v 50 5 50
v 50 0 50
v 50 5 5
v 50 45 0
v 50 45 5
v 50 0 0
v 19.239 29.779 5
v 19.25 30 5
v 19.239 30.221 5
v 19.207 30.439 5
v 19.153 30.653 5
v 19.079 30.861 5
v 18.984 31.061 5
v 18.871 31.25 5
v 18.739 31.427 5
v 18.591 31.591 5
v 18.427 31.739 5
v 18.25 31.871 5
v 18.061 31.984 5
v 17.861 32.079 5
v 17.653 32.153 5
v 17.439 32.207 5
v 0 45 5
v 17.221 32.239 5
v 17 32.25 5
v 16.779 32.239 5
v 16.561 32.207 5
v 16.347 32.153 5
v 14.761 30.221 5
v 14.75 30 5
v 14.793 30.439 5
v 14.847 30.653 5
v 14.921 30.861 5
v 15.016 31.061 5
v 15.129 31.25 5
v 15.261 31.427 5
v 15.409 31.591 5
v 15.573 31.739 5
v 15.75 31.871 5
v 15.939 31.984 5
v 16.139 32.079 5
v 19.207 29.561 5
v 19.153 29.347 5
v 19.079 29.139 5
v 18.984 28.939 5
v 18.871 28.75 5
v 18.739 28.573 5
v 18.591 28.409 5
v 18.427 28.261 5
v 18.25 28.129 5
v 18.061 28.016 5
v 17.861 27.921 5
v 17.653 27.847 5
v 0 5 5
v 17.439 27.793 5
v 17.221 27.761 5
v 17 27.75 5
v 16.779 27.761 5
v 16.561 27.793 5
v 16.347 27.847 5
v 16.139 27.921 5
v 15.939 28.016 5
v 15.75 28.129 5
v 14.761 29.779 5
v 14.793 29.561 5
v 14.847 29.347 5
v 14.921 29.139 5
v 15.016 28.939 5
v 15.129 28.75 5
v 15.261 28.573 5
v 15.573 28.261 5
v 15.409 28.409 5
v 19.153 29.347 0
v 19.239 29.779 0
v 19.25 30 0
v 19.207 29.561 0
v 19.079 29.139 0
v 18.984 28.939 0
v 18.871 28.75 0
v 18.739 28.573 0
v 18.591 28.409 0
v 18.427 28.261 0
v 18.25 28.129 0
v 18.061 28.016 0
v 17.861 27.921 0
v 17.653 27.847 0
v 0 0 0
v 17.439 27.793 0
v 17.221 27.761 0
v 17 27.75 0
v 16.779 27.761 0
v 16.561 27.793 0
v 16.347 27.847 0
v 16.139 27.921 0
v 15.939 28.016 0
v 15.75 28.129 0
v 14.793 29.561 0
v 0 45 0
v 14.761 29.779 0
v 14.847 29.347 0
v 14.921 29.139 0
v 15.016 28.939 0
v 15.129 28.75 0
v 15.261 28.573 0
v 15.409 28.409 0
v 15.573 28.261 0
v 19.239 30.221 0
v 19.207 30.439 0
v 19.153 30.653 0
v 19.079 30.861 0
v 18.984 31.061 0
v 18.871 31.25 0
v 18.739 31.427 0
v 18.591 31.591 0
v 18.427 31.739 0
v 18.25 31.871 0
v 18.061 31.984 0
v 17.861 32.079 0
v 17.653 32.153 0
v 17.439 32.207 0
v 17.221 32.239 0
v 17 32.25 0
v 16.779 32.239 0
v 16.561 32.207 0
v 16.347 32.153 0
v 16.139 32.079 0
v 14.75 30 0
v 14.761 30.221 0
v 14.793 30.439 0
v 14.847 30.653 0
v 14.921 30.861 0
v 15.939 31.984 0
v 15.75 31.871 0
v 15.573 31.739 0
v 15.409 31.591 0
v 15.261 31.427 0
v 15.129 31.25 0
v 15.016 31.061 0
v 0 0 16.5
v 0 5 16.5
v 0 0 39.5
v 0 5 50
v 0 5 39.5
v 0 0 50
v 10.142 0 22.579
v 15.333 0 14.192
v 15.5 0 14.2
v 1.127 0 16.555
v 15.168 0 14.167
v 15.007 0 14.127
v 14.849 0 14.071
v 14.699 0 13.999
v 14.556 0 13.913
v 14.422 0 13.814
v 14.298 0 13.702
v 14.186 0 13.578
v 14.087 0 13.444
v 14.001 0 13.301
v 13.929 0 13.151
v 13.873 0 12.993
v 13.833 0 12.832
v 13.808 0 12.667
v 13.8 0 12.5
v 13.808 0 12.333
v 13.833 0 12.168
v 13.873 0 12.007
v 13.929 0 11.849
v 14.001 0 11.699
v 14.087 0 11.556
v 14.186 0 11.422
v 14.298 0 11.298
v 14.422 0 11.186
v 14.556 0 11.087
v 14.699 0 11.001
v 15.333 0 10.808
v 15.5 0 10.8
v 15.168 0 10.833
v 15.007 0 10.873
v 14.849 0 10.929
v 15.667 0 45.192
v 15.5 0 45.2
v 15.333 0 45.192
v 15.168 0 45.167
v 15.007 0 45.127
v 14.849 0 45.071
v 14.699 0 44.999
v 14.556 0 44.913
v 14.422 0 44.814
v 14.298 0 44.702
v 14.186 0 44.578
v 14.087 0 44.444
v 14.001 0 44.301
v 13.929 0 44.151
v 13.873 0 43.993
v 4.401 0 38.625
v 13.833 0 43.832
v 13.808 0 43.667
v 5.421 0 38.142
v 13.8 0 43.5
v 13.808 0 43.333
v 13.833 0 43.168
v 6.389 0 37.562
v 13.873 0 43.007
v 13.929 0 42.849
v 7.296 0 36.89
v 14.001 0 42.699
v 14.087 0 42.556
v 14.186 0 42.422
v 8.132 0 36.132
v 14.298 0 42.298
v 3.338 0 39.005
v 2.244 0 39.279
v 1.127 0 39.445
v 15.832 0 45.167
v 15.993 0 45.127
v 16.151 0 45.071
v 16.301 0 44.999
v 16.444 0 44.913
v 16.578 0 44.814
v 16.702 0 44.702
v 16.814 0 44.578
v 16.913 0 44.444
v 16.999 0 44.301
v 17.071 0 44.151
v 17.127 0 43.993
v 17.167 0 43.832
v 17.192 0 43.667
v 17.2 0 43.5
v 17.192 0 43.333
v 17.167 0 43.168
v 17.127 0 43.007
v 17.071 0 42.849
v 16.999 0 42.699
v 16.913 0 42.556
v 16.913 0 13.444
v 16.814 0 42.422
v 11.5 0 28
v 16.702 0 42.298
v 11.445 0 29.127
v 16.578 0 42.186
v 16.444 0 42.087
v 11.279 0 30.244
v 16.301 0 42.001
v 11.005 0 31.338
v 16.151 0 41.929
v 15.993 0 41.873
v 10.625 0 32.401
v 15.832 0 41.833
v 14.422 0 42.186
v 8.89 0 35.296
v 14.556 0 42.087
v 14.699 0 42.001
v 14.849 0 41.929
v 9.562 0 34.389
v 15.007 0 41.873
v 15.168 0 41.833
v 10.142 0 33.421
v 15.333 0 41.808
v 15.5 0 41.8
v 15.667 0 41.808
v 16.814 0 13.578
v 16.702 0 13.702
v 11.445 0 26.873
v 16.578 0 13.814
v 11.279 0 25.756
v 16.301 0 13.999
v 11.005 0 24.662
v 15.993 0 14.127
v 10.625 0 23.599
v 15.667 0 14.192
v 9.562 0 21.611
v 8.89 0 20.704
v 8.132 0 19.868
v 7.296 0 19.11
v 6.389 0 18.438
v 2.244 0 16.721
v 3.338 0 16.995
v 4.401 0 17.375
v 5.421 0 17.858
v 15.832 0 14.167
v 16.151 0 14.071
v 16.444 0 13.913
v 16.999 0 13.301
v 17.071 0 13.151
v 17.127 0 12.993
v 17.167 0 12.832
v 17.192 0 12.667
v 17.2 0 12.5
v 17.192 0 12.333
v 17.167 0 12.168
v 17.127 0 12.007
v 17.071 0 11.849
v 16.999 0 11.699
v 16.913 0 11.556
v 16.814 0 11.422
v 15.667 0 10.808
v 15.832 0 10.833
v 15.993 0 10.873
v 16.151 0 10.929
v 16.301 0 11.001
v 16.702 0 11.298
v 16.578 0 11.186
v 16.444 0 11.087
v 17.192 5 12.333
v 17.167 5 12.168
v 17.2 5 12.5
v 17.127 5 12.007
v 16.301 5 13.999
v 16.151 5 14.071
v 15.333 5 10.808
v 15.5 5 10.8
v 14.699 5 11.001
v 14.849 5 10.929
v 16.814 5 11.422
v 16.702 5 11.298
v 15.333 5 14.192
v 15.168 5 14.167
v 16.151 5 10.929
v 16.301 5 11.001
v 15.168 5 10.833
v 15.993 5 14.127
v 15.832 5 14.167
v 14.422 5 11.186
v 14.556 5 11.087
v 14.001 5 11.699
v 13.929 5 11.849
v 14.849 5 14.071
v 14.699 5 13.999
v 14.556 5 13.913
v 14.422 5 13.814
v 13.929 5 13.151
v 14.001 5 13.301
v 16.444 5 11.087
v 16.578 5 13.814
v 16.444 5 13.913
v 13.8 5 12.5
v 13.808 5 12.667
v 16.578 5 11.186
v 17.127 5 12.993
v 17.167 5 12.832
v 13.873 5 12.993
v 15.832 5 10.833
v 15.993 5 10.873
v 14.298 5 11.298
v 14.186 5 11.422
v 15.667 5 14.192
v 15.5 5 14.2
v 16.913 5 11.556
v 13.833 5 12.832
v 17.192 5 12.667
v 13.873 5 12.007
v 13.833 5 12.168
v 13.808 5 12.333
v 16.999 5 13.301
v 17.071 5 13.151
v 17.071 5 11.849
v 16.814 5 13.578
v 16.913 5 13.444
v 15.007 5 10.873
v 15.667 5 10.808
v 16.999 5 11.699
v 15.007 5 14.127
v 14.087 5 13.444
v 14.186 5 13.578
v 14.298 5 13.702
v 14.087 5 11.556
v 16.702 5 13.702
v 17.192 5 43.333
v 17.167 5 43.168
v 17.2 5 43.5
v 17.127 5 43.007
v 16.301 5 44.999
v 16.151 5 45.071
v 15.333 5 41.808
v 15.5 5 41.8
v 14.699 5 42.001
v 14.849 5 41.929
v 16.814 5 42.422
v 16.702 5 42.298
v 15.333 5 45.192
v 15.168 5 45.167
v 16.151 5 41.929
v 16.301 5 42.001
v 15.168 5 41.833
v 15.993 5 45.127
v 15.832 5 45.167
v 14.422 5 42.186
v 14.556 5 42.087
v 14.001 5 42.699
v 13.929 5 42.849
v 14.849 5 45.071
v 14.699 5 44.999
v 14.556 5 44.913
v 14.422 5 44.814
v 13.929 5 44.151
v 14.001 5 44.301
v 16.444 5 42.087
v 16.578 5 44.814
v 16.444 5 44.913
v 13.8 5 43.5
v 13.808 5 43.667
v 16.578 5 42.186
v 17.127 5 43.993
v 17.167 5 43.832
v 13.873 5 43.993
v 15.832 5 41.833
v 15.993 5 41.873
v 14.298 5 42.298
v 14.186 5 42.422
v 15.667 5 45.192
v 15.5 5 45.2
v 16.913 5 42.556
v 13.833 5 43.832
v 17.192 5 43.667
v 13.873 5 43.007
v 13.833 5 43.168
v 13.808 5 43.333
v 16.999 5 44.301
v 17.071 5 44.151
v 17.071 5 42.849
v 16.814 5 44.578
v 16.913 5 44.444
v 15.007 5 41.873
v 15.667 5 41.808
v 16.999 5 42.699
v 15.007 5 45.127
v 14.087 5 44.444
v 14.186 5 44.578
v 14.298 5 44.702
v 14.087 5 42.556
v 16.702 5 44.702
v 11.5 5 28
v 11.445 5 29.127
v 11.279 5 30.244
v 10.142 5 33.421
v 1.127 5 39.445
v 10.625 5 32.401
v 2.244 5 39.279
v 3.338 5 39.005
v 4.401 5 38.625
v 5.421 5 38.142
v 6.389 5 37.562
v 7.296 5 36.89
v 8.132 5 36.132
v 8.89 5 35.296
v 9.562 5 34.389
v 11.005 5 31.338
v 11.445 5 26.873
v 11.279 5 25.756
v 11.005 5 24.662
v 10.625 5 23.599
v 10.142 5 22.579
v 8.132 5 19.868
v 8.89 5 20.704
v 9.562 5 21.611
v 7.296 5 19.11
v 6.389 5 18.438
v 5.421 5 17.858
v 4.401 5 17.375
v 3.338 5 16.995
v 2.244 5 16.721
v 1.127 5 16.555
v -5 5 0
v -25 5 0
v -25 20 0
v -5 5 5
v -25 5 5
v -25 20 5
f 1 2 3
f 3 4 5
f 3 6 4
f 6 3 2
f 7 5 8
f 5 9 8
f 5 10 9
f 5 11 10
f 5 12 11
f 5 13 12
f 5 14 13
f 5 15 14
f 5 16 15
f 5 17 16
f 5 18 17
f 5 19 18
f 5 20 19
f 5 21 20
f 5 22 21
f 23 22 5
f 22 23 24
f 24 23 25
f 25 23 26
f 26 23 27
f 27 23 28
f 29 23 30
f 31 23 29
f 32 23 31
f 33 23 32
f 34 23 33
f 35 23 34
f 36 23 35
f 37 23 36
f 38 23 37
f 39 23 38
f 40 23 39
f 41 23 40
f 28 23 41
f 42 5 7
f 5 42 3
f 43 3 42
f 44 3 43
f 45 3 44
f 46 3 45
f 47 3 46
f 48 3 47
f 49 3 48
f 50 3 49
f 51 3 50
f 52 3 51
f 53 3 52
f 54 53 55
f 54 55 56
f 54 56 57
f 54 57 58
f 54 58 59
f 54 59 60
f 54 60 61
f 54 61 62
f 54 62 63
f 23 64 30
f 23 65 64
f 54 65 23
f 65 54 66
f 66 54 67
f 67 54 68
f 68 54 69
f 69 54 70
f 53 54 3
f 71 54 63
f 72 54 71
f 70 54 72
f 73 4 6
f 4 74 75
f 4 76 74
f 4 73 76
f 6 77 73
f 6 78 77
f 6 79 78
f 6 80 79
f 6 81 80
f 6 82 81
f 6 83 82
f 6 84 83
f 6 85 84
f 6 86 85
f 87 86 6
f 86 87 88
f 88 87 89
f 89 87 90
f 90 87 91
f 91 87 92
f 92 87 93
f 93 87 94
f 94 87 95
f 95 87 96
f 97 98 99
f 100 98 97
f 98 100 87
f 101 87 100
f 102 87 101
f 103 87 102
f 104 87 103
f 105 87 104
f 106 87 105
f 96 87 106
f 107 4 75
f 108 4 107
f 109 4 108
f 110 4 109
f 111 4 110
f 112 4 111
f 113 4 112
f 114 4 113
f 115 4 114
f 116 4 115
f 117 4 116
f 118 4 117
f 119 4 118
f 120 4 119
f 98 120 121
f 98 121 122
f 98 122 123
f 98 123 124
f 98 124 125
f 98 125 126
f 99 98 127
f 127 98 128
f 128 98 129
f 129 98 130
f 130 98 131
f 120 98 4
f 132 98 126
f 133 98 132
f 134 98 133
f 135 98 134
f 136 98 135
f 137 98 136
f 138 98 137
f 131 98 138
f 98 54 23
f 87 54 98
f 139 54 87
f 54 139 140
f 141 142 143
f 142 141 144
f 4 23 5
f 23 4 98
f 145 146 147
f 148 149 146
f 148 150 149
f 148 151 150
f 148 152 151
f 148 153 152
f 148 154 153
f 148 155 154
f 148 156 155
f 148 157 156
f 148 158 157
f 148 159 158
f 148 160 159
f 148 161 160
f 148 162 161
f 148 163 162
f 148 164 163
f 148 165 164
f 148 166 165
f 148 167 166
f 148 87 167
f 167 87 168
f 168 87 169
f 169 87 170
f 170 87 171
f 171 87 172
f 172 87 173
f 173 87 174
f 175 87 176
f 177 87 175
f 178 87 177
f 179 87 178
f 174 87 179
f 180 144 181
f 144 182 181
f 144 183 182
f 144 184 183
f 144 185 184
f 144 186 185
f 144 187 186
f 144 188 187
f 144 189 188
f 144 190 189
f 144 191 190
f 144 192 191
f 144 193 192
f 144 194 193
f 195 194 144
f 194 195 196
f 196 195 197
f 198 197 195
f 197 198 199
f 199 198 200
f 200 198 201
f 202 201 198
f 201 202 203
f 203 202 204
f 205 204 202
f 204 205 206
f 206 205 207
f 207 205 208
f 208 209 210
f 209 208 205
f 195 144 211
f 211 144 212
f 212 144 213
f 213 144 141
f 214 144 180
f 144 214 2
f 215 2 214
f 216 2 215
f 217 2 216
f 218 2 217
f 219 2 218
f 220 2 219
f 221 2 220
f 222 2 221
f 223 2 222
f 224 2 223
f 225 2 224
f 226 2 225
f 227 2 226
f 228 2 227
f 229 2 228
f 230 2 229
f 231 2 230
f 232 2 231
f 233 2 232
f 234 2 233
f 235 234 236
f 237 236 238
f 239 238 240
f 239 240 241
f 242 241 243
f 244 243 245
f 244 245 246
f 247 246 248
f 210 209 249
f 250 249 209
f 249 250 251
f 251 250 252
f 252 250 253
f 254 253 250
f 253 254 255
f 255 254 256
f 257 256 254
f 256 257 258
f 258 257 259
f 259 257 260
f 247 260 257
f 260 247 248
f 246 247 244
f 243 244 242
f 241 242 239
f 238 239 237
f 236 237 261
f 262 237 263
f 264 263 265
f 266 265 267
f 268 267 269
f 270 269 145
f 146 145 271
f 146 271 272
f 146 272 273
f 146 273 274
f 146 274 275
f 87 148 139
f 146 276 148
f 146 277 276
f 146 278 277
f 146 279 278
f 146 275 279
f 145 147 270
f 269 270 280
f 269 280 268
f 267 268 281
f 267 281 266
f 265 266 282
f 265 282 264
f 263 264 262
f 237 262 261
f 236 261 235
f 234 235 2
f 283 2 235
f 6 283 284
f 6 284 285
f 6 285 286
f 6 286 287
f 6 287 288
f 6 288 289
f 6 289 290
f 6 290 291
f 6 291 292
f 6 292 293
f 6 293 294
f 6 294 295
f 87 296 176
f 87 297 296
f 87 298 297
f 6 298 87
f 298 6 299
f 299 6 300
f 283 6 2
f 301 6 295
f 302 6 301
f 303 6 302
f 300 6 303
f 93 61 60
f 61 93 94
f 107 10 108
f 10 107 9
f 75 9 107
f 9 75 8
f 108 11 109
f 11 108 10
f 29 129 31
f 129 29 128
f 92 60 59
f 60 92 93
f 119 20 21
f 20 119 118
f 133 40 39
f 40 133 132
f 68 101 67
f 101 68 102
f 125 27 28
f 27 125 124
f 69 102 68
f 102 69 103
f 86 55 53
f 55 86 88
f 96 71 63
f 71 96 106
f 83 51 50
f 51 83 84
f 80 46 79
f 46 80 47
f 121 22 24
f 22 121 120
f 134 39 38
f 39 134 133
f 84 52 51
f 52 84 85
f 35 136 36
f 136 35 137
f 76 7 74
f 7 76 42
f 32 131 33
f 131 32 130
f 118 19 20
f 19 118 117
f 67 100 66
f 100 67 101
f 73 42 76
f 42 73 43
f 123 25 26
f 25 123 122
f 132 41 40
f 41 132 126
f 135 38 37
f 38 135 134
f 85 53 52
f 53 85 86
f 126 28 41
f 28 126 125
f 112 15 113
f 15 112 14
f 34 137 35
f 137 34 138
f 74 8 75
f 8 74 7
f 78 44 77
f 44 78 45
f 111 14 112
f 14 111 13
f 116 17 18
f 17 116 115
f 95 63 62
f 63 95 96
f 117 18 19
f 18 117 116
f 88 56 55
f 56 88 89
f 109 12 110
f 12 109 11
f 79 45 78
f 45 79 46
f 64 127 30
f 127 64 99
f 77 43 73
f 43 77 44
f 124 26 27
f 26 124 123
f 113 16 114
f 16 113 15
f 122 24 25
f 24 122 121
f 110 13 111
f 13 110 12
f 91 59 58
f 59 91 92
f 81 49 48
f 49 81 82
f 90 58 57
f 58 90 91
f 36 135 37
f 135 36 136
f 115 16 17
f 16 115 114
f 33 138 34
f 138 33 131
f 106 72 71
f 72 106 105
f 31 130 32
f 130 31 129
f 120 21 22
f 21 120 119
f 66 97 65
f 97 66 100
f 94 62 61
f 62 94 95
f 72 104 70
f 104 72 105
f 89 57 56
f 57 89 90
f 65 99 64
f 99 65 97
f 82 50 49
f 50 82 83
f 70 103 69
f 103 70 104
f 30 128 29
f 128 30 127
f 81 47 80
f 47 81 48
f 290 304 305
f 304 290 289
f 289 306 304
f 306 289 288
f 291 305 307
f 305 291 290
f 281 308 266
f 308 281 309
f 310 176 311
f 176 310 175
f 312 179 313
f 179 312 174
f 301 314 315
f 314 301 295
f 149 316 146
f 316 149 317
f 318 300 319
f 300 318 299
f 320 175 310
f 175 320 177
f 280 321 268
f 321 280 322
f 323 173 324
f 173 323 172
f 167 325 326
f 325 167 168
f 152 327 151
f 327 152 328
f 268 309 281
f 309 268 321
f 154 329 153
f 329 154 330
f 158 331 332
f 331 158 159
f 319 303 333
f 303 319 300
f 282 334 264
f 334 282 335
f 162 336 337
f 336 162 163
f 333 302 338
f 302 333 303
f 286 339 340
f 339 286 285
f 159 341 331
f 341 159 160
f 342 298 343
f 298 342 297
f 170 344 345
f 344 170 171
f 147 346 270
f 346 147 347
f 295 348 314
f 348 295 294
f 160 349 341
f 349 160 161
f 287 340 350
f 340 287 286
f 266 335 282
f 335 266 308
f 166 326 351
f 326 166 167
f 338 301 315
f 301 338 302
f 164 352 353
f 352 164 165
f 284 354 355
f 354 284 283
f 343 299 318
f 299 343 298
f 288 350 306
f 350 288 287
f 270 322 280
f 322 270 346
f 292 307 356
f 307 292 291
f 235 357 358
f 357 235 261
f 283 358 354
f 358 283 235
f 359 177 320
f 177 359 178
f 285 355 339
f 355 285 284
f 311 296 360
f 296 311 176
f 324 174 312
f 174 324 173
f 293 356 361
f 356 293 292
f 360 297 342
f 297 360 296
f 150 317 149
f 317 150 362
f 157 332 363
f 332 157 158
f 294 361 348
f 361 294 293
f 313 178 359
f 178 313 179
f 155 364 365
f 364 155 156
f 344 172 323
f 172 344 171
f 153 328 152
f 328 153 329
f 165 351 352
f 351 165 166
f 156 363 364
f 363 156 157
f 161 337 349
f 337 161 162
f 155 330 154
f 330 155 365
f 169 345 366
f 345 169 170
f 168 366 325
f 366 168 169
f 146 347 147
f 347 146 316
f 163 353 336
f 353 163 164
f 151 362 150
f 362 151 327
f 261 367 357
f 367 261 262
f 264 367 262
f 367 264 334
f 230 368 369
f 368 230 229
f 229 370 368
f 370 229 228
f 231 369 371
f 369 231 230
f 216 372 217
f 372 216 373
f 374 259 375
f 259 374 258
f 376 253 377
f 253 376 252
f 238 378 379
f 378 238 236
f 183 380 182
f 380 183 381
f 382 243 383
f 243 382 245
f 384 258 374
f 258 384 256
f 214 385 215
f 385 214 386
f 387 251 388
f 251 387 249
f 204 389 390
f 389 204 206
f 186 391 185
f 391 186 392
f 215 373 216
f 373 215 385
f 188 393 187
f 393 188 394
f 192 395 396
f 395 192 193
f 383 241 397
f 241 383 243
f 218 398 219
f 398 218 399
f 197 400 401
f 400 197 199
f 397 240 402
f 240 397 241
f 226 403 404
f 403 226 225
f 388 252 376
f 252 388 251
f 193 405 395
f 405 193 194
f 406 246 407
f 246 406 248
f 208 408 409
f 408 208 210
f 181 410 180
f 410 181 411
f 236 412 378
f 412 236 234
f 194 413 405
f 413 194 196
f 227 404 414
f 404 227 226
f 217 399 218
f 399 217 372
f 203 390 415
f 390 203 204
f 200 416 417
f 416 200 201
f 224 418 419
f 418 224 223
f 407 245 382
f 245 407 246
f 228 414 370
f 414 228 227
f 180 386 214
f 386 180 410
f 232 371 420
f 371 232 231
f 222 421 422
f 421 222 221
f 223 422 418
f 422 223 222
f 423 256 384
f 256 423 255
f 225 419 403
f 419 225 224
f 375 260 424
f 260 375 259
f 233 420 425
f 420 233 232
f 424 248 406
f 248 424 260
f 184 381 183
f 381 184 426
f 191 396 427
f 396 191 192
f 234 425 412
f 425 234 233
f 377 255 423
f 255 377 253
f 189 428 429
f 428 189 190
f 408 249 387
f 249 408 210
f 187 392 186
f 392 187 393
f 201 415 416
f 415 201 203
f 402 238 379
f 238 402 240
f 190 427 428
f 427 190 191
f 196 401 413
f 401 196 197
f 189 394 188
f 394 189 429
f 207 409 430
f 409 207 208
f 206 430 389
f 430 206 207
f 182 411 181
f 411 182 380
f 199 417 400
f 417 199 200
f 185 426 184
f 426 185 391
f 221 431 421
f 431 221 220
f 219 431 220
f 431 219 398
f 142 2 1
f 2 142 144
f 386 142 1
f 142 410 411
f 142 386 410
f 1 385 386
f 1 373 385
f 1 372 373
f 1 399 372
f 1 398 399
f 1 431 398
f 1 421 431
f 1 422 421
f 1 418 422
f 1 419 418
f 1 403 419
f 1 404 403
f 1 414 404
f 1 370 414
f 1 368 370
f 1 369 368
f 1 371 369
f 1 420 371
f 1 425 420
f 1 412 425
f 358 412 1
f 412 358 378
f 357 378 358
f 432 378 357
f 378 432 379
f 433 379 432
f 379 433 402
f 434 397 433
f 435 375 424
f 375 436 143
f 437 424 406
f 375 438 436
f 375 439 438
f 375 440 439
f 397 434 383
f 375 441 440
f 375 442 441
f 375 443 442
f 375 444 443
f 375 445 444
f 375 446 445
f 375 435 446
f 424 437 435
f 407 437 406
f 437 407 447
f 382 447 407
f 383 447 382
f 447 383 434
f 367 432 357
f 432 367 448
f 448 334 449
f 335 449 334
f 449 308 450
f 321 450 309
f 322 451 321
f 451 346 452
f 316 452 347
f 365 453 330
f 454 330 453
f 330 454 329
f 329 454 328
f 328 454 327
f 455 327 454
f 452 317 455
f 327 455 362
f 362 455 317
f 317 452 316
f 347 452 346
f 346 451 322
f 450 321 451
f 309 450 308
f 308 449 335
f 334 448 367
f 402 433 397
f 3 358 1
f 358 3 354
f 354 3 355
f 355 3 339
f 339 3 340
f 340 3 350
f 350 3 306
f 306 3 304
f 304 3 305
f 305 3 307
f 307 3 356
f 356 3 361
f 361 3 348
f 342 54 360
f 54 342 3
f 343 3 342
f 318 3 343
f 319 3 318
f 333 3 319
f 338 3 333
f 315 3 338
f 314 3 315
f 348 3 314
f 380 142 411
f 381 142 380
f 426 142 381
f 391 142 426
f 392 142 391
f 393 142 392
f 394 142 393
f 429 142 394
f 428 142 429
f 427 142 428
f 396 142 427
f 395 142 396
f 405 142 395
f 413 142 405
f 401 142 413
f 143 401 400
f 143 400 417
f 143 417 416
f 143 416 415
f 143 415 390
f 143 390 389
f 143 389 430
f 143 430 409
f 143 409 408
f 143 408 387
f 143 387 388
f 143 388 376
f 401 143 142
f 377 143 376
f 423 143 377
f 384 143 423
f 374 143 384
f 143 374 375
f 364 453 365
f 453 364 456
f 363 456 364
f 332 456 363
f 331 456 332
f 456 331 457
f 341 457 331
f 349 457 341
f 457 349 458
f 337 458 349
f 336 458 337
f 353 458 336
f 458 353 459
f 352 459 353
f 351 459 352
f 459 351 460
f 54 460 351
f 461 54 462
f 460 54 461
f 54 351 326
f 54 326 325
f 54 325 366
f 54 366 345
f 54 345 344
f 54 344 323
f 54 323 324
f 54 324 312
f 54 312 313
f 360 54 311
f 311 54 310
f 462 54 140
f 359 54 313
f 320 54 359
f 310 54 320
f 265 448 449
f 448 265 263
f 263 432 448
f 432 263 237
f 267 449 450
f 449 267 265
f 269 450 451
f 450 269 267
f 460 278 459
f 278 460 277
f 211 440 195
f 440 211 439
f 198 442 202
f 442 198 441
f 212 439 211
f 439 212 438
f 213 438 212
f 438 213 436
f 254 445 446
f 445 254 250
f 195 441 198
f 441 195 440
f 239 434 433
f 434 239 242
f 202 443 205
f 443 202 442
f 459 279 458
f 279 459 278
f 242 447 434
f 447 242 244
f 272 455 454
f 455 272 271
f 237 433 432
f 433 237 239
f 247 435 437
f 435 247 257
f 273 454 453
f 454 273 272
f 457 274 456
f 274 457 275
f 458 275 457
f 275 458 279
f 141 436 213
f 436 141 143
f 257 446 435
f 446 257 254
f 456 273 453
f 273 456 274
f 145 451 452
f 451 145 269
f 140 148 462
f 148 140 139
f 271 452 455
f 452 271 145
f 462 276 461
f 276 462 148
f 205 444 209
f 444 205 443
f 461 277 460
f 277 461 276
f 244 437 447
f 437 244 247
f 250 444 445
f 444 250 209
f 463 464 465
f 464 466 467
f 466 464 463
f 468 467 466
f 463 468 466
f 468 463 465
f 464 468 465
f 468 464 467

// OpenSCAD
// NEMA 17 Stepper Motor L-Bracket for Syringe Pump
// Final Corrected Version

// --- Dimensions ---
// Base Plate
base_x_min = -25;
base_x_max = 25;
base_y_min = 0;
base_y_max = 45;
base_z_height = 5;

// Base Plate Holes (M4)
m4_hole_dia = 4.5;
m4_hole_x1 = -17;
m4_hole_y1 = 30;
m4_hole_x2 = 17;
m4_hole_y2 = 30;

// Vertical Motor Plate
motor_plate_x_min = -25;
motor_plate_x_max = 25;
motor_plate_y_min = 0;
motor_plate_y_max = 5;
motor_plate_z_height = 50;

// Motor Boss Hole (Centering)
boss_hole_dia = 23;
boss_hole_x = 0;
boss_hole_z = 28;

// Motor Screw Holes (M3)
m3_hole_dia = 3.4;
m3_pattern_size = 31;

// Gussets
gusset_thickness = 5;
gusset_leg_y = 20;
gusset_leg_z = 20;
gusset_x_left_min = -25;
gusset_x_left_max = -20;
gusset_x_right_min = 20;
gusset_x_right_max = 25;

// Resolution
$fn = 64;

// --- Modeling ---

module gusset_shape() {
    // A right triangle in YZ plane
    // Corner at y=5, z=5. Legs are 20mm.
    // Vertices in YZ: (5,5), (25,5), (5,25)
    polygon(points = [
        [0, 5], 
        [gusset_leg_y, 5], 
        [0, gusset_leg_z]
    ]);
}

// We use a union of all parts to ensure it is a single solid body
union() {
    // 1. Main Base Plate
    // Centered on X: width is 50, so X goes from -25 to 25.
    // Y goes from 0 to 45.
    difference() {
        cube([base_x_max - base_x_min, base_y_max - base_y_min, base_z_height]);
        
        // M4 Holes (Vertical through holes)
        // Holes are at (x=-17, y=30) and (x=17, y=30)
        translate([m4_hole_x1, m4_hole_y1, -1])
            cylinder(d = m4_hole_dia, h = base_z_height + 2);
        translate([m4_hole_x2, m4_hole_y2, -1])
            cylinder(d = m4_hole_dia, h = base_z_height + 2);
    }

    // 2. Vertical Motor Plate
    // Standing on the back edge of the base (y=0 to y=5).
    // X from -25 to 25. Z from 0 to 50.
    difference() {
        cube([base_x_max - base_x_min, motor_plate_y_max - motor_plate_y_min, motor_plate_z_height]);
        
        // Motor Centering Boss Hole (Cut along Y axis)
        // Center is x=0, z=28.
        translate([boss_hole_x, -1, boss_hole_z])
            rotate([-90, 0, 0])
                cylinder(d = boss_hole_dia, h = motor_plate_y_max + 2);
        
        // M3 Screw Holes (4 holes on 31mm square pattern)
        // Pattern is centered on the boss hole (0, 28)
        for (px = [-m3_pattern_size/2, m3_pattern_size/2]) {
            for (pz = [-m3_pattern_size/2, m3_pattern_size/2]) {
                translate([px, -1, boss_hole_z + pz])
                    rotate([-90, 0, 0])
                        cylinder(d = m3_hole_dia, h = motor_plate_y_max + 2);
            }
        }
    }

    // 3. Gussets
    // Left Gusset: x from -25 to -20.
    // The gusset is a right triangle in YZ plane.
    // The corner is at y=5, z=5.
    // Since the base is 0-5 and plate is 0-5, the corner is at the intersection.
    translate([gusset_x_left_min, 0, 0])
        linear_extrude(height = gusset_thickness)
            gusset_shape();
            
    // Right Gusset: x from 20 to 25.
    translate([gusset_x_right_max - gusset_thickness, 0, 0])
        linear_extrude(height = gusset_thickness)
            gusset_shape();
}

// Verification of coordinates:
// Base: X[-25,25], Y[0,45], Z[0,5]
// Plate: X[-25,25], Y[0,5], Z[0,50]
// Gussets: X[-25,-20] and [20,25], Y[5,25], Z[5,25]
// Note: The gusset_shape polygon uses Y=5 as the base, so the gusset 
// starts at Y=5 and goes to Y=25. This is flush with the vertical plate 
// which is at Y=0 to 5.
